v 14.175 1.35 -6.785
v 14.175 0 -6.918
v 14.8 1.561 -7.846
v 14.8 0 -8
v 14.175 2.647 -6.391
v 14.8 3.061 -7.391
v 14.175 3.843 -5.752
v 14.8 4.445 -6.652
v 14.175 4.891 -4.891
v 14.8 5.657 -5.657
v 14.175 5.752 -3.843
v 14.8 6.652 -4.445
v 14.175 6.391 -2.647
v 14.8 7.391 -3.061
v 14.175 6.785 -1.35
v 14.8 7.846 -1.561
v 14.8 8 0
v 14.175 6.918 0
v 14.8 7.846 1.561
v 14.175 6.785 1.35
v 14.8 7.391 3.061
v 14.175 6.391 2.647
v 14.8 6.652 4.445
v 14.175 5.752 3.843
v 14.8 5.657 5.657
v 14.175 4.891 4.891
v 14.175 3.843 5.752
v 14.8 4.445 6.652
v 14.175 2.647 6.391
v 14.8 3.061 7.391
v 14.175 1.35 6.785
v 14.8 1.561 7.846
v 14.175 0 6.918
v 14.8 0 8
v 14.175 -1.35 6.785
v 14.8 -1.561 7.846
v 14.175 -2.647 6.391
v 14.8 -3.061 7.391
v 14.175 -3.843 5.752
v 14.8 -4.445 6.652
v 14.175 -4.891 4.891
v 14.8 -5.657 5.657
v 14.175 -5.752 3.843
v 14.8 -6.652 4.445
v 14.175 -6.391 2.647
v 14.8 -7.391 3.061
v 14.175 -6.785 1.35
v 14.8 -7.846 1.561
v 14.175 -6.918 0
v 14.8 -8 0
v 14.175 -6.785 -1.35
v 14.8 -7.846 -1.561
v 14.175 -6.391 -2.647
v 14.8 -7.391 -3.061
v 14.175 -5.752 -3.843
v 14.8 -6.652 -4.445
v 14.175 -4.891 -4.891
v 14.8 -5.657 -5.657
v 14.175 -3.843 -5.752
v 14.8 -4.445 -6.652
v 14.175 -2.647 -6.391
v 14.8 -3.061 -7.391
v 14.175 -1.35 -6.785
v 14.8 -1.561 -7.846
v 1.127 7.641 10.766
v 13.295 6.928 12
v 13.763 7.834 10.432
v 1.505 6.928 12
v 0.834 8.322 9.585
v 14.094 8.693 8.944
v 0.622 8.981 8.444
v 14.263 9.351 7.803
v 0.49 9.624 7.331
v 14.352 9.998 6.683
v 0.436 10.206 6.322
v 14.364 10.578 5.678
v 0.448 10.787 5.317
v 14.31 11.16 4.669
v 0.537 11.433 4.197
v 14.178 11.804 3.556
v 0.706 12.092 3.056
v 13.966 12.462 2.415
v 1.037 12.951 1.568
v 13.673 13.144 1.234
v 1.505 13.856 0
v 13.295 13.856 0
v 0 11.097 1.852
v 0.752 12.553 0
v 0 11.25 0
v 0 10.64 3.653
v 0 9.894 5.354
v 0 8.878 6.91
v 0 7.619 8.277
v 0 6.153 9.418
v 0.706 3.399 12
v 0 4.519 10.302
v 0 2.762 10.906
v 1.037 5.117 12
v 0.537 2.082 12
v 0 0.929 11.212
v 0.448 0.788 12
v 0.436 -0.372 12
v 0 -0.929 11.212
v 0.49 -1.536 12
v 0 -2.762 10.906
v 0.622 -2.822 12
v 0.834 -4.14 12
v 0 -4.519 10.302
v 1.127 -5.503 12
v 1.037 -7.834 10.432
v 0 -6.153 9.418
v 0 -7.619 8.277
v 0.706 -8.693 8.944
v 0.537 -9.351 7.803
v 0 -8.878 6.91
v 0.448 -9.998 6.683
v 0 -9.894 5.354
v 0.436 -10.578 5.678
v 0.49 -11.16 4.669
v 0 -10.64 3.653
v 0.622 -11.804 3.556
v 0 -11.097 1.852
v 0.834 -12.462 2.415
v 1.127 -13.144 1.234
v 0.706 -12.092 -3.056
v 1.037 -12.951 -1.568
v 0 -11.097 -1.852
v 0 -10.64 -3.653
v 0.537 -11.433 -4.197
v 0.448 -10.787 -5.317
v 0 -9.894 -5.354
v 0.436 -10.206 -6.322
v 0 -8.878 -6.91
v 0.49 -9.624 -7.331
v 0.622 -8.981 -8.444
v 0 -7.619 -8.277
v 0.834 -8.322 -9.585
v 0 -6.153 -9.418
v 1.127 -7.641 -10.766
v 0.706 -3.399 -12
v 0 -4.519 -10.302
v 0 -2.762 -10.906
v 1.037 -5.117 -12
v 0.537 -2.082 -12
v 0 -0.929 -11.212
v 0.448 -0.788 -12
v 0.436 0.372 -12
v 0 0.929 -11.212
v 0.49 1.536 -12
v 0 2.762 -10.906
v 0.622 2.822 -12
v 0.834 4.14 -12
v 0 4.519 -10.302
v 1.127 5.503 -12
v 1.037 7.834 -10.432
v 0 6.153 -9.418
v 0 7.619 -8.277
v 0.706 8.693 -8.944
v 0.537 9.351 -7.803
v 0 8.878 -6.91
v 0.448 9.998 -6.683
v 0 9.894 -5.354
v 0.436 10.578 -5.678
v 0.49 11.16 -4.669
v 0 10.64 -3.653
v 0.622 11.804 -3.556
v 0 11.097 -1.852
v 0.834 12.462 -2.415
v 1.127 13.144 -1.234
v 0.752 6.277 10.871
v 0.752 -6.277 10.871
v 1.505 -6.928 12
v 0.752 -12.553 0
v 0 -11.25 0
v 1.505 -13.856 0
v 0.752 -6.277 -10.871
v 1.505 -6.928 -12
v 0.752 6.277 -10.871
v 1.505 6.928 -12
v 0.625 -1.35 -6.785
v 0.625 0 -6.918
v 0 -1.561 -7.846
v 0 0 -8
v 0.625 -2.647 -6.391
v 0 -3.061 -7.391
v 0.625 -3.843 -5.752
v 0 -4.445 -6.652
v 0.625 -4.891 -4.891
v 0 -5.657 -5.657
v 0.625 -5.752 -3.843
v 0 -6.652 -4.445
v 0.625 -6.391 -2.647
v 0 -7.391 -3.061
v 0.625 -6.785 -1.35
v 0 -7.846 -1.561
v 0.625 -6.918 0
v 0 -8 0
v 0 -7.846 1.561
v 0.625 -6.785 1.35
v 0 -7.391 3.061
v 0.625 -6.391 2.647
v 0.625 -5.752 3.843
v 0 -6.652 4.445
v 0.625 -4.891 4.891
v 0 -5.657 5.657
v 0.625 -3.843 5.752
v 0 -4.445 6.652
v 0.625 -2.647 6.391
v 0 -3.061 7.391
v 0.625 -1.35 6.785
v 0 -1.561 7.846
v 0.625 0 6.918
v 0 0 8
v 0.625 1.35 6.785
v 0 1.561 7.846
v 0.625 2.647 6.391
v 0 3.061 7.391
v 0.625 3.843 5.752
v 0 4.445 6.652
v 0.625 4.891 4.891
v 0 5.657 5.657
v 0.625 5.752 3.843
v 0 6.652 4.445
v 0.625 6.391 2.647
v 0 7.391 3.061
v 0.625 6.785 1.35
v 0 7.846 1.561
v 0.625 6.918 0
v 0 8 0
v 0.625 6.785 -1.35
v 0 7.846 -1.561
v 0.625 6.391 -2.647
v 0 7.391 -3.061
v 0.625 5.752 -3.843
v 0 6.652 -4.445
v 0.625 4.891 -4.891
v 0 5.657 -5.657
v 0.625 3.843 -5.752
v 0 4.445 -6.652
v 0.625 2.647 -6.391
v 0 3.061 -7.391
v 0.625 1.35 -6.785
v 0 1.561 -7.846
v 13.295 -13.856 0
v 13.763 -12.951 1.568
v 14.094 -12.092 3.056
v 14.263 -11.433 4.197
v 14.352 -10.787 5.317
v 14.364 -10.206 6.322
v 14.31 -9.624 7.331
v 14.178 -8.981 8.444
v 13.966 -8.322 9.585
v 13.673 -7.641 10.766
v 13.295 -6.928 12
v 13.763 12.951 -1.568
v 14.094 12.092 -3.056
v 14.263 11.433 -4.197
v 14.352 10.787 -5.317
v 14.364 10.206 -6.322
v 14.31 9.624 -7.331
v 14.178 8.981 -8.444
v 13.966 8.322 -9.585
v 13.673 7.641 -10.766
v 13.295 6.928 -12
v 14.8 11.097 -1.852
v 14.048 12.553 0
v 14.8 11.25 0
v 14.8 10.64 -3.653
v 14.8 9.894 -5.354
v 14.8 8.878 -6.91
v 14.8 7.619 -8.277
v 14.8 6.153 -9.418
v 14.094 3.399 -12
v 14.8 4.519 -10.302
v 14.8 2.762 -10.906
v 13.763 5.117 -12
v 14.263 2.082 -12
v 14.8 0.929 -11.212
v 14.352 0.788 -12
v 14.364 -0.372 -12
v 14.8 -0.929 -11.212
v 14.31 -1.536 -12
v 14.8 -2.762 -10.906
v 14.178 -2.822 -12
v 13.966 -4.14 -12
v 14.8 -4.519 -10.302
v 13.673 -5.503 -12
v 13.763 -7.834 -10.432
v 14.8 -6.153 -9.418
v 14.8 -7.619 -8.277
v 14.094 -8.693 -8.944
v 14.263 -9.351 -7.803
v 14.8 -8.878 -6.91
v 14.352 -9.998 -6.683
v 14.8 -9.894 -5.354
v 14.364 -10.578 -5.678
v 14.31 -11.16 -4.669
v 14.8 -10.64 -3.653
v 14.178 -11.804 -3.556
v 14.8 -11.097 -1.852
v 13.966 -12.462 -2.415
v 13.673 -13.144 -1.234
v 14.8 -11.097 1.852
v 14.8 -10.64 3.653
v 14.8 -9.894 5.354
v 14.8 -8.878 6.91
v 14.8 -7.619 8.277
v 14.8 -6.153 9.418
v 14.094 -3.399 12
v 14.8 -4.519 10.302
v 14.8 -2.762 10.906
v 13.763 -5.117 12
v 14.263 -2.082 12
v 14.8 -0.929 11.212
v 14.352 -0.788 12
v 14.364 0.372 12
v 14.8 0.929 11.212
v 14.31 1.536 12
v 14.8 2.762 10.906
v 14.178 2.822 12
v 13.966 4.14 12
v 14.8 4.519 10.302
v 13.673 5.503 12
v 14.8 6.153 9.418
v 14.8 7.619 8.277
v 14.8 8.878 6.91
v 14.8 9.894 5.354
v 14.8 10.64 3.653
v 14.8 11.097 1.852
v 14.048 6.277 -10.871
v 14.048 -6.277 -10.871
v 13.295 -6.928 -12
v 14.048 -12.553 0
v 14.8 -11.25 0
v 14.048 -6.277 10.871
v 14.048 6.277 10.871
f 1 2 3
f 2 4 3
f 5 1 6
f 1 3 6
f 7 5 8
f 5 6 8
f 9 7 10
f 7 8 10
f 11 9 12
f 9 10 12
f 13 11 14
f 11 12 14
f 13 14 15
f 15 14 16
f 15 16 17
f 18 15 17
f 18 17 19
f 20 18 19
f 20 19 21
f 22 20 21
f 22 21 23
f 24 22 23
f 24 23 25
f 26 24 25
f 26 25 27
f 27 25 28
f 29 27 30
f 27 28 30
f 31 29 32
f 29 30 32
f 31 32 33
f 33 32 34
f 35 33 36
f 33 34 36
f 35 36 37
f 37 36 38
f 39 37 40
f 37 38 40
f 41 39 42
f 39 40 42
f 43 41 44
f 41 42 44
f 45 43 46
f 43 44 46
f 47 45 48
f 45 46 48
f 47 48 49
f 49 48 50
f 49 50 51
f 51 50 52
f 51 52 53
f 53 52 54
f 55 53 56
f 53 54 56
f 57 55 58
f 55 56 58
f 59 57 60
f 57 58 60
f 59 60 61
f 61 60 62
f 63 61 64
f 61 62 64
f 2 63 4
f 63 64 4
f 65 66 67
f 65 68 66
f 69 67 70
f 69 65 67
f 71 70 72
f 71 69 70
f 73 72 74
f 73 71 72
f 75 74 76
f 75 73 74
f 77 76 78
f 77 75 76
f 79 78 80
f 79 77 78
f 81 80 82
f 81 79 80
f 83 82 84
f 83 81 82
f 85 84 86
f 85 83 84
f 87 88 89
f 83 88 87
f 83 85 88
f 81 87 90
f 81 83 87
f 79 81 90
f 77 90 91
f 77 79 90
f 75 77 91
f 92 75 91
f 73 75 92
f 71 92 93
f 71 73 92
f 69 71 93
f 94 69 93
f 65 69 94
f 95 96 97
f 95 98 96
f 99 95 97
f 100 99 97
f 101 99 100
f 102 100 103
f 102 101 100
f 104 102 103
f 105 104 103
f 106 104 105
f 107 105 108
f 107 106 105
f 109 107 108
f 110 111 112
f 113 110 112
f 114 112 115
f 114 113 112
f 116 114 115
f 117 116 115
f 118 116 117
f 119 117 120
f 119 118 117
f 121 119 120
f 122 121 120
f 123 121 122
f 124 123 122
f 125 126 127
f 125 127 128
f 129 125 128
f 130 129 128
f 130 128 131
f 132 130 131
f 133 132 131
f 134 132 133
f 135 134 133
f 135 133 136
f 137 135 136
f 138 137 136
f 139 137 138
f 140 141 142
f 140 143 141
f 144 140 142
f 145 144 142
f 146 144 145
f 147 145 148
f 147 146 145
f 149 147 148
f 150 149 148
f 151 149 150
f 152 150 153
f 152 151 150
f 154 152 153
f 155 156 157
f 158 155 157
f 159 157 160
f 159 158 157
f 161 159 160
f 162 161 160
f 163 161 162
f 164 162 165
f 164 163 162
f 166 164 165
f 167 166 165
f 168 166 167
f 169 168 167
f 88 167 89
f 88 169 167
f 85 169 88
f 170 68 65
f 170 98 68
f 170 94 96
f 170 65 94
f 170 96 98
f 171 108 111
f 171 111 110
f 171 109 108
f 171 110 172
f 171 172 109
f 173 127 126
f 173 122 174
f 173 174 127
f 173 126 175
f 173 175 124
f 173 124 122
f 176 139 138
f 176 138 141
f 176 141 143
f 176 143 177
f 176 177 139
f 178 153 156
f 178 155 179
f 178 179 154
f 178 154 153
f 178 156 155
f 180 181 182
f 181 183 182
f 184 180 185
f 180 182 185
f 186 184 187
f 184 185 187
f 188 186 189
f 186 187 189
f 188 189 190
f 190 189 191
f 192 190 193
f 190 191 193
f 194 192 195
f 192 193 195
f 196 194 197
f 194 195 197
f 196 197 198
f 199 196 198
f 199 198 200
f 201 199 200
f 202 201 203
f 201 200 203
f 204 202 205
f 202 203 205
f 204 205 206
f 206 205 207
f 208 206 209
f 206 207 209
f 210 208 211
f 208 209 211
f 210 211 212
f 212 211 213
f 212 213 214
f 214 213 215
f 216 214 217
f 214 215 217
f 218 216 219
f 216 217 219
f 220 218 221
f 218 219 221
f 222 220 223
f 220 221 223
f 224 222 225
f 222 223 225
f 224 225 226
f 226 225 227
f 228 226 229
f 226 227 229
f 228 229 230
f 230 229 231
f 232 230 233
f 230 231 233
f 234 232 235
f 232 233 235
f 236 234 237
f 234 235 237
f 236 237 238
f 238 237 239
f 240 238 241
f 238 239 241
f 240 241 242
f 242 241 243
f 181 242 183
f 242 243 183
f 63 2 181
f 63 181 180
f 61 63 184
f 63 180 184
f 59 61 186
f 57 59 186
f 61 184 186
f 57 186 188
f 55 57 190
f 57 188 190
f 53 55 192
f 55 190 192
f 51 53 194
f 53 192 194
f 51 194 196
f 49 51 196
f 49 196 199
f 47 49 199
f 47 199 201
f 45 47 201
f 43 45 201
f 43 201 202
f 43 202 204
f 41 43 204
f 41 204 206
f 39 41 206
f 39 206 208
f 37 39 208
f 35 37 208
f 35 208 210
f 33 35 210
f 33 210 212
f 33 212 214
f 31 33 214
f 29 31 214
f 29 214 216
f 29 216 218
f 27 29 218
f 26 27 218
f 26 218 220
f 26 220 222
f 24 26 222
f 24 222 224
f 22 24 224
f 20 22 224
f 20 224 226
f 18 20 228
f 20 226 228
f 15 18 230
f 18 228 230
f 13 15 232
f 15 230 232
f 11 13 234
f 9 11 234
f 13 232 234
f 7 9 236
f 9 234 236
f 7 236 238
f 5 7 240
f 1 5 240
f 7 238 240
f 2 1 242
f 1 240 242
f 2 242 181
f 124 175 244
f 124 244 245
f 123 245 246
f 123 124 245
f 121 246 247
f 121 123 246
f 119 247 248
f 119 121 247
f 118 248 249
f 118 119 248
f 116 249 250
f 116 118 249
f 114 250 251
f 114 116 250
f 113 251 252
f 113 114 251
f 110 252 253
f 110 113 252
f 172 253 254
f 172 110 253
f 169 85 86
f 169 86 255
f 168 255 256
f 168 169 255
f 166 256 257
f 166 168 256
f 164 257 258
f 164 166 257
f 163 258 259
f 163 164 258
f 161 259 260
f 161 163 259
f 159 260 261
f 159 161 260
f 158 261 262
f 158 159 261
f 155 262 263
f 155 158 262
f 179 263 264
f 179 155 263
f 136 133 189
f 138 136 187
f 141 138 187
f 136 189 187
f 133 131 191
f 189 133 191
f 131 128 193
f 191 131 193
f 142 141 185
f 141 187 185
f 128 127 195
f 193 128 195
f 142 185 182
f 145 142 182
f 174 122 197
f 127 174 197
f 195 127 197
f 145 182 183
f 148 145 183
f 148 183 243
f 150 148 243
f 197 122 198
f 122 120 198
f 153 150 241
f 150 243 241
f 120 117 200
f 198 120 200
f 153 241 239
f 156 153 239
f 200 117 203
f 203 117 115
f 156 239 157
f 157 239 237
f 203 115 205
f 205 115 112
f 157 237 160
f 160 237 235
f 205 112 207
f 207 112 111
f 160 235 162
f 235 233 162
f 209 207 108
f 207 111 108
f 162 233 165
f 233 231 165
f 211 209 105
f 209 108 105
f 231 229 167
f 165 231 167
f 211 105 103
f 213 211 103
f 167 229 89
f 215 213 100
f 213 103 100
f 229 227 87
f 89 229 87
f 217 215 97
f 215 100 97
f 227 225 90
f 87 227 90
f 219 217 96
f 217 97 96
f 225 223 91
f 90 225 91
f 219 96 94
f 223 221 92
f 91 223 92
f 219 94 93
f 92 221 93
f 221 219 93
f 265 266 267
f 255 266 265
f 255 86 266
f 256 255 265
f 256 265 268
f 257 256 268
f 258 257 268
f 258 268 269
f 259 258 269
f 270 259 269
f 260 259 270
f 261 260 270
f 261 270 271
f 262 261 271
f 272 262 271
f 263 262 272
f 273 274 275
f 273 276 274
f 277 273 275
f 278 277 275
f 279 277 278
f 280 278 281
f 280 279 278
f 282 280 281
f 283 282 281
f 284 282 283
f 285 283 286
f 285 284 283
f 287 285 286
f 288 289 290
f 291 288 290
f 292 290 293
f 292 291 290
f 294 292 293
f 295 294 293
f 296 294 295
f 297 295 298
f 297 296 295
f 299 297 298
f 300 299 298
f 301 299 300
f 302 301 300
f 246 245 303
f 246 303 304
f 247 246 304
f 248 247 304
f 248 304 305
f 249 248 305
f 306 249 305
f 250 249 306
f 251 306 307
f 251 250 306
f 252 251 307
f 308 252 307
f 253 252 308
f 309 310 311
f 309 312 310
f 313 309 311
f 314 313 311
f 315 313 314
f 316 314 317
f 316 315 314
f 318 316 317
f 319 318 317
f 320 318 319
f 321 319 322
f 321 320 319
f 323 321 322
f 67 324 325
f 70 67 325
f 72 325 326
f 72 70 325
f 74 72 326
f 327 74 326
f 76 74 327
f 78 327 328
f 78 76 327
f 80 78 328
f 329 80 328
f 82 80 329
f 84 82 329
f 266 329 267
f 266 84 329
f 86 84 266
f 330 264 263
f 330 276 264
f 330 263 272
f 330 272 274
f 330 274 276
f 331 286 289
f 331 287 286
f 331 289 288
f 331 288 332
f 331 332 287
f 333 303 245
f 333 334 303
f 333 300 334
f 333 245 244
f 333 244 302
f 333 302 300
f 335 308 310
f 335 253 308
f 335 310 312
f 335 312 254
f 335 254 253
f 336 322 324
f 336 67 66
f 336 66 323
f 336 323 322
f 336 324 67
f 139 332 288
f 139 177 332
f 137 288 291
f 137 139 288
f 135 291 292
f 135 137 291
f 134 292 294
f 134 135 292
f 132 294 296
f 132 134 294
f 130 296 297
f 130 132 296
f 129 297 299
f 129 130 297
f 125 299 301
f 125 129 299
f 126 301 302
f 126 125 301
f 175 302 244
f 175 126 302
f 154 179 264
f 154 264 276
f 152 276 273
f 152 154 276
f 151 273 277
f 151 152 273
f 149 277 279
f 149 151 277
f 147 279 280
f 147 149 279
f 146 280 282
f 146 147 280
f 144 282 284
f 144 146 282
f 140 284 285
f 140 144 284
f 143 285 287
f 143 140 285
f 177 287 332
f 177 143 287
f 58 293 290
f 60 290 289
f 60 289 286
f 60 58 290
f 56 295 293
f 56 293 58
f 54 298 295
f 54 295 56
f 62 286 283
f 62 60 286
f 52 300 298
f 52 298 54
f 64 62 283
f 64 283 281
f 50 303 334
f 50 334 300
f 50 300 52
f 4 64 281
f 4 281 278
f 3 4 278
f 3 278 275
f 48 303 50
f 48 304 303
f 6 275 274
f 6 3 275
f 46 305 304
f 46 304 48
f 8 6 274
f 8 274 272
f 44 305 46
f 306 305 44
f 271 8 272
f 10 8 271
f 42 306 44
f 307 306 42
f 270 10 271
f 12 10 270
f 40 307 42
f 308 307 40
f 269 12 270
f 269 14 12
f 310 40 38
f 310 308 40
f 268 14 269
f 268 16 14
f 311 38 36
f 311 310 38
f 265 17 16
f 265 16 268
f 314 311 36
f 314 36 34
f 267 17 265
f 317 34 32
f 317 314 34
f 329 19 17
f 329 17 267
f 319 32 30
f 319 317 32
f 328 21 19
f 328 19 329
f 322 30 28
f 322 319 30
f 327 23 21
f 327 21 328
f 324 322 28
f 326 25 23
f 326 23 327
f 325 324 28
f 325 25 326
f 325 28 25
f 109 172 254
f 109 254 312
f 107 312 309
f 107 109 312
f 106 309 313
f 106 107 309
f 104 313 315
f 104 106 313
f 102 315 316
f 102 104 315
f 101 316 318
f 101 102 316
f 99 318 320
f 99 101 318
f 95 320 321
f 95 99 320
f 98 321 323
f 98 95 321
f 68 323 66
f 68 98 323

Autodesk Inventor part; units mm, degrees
ref_plane "YZ Plane" through (0, 0, 0) normal (1, 0, 0) x (0, 1, 0)
ref_plane "XZ Plane" through (0, 0, 0) normal (0, 1, 0) x (-1, 0, 0)
sketch "Эскиз1" plane through (0, 0, 0) normal (1, 0, 0) x (0, 1, 0)
  line L0 (-13.8564, 0) -> (-6.9282, 12)
  line L1 (-6.9282, 12) -> (6.9282, 12)
  line L2 (6.9282, 12) -> (13.8564, 0)
  line L3 (13.8564, 0) -> (6.9282, -12)
  line L4 (6.9282, -12) -> (-6.9282, -12)
  line L5 (-6.9282, -12) -> (-13.8564, 0)
  point P0 (0, 0)
  point P1 (0, 0)
  dimension "d0" = 27.7128
extrude "Базовый элемент" add sketch "Эскиз1" along normal blind 14.8
sketch "Эскиз2" plane through (0, 0, 0) normal (0, 0, 1) x (1, 0, 0)
  line L0 (0, 6.9282) -> (0, 13.8564) projected
  line L1 (0, 13.8564) -> (14.8, 13.8564) projected
  line L2 (14.8, 6.9282) -> (14.8, 13.8564) projected
  line L3 (-2.96, 0) -> (17.76, 0) projected
  line L4 (1.5048, 13.8564) -> (0, 11.25)
  line L5 (13.2952, 13.8564) -> (14.8, 11.25)
  dimension "d3" = 30
  dimension "d4" = 30
  dimension "d5" = 22.5
  dimension "d6" = 22.5
revolve "Фаска1" cut sketch "Эскиз2" angle 360 about axis through (-10, 0, 0) along (1, 0, 0)
sketch "Эскиз3" plane through (14.8, 0, 0) normal (1, 0, 0) x (0, 0, -1)
  arc A0 (-0.625, -1.0825) -> (0.625, -1.0825) centre (0, 0) ccw projected
hole "Резьба" at (14.8, 0, 0) direction (-1, 0, 0) diameter 13.835 end through all thread size "M16x2" class "6H" standard "ISO Metric profile"
chamfer "Фаска2" distance 1.0825 angle 30 1 edges at (14.8, 0, 6.9175) measured on face at (14.8, 9.6801, -1.1754)
chamfer "Фаска3" distance 1.0825 angle 30 1 edges at (0, 0, 6.9175) measured on face at (0, 9.6801, -1.1754)
ref_plane "Work Plane1" through (-25.1166, 0, 0) normal (0, -0.866, -0.5) x (1, 0, 0)
equation "\"d0\" = 1.1547 * SW"
equation "\"d1\" = KOH"
equation "\"d3\" = ANG1"
equation "\"d4\" = ANG2"
equation "\"d5\" = SW0"
equation "\"d6\" = SW01"
equation "\"d8\" = -0.5 * GD1 + 0.5 * NND"
equation "\"d40\" = -0.5 * GD1 + 0.5 * NND"
equation "\"d10\" = -0.5 * GD1 + 0.5 * NND"
equation "\"d41\" = -0.5 * GD1 + 0.5 * NND"
equation "\"ANG1\" = 30deg"
equation "\"ANG2\" = 30deg"
equation "\"NND\" = 16"
equation "\"KOH\" = 14.8"
equation "\"SW\" = 24"
equation "\"SW0\" = 22.5"
equation "\"SW01\" = SW0"
equation "\"GUL\" = 0.541266 * PTC"
equation "\"LADI\" = 22.8"
equation "\"TOA\" = 30deg"
equation "\"FAWI\" = 30deg"
equation "\"PTC\" = 2"
equation "\"THREADDIA\" = 16"
equation "\"E0\" = 1.155 * SW"
equation "\"GAL\" = 0.541266 * PTC"
equation "\"GD1\" = 13.834936"
properties part number "M16-6H ГОСТ ISO 4032-2014" material "Сталь, мягкая"
